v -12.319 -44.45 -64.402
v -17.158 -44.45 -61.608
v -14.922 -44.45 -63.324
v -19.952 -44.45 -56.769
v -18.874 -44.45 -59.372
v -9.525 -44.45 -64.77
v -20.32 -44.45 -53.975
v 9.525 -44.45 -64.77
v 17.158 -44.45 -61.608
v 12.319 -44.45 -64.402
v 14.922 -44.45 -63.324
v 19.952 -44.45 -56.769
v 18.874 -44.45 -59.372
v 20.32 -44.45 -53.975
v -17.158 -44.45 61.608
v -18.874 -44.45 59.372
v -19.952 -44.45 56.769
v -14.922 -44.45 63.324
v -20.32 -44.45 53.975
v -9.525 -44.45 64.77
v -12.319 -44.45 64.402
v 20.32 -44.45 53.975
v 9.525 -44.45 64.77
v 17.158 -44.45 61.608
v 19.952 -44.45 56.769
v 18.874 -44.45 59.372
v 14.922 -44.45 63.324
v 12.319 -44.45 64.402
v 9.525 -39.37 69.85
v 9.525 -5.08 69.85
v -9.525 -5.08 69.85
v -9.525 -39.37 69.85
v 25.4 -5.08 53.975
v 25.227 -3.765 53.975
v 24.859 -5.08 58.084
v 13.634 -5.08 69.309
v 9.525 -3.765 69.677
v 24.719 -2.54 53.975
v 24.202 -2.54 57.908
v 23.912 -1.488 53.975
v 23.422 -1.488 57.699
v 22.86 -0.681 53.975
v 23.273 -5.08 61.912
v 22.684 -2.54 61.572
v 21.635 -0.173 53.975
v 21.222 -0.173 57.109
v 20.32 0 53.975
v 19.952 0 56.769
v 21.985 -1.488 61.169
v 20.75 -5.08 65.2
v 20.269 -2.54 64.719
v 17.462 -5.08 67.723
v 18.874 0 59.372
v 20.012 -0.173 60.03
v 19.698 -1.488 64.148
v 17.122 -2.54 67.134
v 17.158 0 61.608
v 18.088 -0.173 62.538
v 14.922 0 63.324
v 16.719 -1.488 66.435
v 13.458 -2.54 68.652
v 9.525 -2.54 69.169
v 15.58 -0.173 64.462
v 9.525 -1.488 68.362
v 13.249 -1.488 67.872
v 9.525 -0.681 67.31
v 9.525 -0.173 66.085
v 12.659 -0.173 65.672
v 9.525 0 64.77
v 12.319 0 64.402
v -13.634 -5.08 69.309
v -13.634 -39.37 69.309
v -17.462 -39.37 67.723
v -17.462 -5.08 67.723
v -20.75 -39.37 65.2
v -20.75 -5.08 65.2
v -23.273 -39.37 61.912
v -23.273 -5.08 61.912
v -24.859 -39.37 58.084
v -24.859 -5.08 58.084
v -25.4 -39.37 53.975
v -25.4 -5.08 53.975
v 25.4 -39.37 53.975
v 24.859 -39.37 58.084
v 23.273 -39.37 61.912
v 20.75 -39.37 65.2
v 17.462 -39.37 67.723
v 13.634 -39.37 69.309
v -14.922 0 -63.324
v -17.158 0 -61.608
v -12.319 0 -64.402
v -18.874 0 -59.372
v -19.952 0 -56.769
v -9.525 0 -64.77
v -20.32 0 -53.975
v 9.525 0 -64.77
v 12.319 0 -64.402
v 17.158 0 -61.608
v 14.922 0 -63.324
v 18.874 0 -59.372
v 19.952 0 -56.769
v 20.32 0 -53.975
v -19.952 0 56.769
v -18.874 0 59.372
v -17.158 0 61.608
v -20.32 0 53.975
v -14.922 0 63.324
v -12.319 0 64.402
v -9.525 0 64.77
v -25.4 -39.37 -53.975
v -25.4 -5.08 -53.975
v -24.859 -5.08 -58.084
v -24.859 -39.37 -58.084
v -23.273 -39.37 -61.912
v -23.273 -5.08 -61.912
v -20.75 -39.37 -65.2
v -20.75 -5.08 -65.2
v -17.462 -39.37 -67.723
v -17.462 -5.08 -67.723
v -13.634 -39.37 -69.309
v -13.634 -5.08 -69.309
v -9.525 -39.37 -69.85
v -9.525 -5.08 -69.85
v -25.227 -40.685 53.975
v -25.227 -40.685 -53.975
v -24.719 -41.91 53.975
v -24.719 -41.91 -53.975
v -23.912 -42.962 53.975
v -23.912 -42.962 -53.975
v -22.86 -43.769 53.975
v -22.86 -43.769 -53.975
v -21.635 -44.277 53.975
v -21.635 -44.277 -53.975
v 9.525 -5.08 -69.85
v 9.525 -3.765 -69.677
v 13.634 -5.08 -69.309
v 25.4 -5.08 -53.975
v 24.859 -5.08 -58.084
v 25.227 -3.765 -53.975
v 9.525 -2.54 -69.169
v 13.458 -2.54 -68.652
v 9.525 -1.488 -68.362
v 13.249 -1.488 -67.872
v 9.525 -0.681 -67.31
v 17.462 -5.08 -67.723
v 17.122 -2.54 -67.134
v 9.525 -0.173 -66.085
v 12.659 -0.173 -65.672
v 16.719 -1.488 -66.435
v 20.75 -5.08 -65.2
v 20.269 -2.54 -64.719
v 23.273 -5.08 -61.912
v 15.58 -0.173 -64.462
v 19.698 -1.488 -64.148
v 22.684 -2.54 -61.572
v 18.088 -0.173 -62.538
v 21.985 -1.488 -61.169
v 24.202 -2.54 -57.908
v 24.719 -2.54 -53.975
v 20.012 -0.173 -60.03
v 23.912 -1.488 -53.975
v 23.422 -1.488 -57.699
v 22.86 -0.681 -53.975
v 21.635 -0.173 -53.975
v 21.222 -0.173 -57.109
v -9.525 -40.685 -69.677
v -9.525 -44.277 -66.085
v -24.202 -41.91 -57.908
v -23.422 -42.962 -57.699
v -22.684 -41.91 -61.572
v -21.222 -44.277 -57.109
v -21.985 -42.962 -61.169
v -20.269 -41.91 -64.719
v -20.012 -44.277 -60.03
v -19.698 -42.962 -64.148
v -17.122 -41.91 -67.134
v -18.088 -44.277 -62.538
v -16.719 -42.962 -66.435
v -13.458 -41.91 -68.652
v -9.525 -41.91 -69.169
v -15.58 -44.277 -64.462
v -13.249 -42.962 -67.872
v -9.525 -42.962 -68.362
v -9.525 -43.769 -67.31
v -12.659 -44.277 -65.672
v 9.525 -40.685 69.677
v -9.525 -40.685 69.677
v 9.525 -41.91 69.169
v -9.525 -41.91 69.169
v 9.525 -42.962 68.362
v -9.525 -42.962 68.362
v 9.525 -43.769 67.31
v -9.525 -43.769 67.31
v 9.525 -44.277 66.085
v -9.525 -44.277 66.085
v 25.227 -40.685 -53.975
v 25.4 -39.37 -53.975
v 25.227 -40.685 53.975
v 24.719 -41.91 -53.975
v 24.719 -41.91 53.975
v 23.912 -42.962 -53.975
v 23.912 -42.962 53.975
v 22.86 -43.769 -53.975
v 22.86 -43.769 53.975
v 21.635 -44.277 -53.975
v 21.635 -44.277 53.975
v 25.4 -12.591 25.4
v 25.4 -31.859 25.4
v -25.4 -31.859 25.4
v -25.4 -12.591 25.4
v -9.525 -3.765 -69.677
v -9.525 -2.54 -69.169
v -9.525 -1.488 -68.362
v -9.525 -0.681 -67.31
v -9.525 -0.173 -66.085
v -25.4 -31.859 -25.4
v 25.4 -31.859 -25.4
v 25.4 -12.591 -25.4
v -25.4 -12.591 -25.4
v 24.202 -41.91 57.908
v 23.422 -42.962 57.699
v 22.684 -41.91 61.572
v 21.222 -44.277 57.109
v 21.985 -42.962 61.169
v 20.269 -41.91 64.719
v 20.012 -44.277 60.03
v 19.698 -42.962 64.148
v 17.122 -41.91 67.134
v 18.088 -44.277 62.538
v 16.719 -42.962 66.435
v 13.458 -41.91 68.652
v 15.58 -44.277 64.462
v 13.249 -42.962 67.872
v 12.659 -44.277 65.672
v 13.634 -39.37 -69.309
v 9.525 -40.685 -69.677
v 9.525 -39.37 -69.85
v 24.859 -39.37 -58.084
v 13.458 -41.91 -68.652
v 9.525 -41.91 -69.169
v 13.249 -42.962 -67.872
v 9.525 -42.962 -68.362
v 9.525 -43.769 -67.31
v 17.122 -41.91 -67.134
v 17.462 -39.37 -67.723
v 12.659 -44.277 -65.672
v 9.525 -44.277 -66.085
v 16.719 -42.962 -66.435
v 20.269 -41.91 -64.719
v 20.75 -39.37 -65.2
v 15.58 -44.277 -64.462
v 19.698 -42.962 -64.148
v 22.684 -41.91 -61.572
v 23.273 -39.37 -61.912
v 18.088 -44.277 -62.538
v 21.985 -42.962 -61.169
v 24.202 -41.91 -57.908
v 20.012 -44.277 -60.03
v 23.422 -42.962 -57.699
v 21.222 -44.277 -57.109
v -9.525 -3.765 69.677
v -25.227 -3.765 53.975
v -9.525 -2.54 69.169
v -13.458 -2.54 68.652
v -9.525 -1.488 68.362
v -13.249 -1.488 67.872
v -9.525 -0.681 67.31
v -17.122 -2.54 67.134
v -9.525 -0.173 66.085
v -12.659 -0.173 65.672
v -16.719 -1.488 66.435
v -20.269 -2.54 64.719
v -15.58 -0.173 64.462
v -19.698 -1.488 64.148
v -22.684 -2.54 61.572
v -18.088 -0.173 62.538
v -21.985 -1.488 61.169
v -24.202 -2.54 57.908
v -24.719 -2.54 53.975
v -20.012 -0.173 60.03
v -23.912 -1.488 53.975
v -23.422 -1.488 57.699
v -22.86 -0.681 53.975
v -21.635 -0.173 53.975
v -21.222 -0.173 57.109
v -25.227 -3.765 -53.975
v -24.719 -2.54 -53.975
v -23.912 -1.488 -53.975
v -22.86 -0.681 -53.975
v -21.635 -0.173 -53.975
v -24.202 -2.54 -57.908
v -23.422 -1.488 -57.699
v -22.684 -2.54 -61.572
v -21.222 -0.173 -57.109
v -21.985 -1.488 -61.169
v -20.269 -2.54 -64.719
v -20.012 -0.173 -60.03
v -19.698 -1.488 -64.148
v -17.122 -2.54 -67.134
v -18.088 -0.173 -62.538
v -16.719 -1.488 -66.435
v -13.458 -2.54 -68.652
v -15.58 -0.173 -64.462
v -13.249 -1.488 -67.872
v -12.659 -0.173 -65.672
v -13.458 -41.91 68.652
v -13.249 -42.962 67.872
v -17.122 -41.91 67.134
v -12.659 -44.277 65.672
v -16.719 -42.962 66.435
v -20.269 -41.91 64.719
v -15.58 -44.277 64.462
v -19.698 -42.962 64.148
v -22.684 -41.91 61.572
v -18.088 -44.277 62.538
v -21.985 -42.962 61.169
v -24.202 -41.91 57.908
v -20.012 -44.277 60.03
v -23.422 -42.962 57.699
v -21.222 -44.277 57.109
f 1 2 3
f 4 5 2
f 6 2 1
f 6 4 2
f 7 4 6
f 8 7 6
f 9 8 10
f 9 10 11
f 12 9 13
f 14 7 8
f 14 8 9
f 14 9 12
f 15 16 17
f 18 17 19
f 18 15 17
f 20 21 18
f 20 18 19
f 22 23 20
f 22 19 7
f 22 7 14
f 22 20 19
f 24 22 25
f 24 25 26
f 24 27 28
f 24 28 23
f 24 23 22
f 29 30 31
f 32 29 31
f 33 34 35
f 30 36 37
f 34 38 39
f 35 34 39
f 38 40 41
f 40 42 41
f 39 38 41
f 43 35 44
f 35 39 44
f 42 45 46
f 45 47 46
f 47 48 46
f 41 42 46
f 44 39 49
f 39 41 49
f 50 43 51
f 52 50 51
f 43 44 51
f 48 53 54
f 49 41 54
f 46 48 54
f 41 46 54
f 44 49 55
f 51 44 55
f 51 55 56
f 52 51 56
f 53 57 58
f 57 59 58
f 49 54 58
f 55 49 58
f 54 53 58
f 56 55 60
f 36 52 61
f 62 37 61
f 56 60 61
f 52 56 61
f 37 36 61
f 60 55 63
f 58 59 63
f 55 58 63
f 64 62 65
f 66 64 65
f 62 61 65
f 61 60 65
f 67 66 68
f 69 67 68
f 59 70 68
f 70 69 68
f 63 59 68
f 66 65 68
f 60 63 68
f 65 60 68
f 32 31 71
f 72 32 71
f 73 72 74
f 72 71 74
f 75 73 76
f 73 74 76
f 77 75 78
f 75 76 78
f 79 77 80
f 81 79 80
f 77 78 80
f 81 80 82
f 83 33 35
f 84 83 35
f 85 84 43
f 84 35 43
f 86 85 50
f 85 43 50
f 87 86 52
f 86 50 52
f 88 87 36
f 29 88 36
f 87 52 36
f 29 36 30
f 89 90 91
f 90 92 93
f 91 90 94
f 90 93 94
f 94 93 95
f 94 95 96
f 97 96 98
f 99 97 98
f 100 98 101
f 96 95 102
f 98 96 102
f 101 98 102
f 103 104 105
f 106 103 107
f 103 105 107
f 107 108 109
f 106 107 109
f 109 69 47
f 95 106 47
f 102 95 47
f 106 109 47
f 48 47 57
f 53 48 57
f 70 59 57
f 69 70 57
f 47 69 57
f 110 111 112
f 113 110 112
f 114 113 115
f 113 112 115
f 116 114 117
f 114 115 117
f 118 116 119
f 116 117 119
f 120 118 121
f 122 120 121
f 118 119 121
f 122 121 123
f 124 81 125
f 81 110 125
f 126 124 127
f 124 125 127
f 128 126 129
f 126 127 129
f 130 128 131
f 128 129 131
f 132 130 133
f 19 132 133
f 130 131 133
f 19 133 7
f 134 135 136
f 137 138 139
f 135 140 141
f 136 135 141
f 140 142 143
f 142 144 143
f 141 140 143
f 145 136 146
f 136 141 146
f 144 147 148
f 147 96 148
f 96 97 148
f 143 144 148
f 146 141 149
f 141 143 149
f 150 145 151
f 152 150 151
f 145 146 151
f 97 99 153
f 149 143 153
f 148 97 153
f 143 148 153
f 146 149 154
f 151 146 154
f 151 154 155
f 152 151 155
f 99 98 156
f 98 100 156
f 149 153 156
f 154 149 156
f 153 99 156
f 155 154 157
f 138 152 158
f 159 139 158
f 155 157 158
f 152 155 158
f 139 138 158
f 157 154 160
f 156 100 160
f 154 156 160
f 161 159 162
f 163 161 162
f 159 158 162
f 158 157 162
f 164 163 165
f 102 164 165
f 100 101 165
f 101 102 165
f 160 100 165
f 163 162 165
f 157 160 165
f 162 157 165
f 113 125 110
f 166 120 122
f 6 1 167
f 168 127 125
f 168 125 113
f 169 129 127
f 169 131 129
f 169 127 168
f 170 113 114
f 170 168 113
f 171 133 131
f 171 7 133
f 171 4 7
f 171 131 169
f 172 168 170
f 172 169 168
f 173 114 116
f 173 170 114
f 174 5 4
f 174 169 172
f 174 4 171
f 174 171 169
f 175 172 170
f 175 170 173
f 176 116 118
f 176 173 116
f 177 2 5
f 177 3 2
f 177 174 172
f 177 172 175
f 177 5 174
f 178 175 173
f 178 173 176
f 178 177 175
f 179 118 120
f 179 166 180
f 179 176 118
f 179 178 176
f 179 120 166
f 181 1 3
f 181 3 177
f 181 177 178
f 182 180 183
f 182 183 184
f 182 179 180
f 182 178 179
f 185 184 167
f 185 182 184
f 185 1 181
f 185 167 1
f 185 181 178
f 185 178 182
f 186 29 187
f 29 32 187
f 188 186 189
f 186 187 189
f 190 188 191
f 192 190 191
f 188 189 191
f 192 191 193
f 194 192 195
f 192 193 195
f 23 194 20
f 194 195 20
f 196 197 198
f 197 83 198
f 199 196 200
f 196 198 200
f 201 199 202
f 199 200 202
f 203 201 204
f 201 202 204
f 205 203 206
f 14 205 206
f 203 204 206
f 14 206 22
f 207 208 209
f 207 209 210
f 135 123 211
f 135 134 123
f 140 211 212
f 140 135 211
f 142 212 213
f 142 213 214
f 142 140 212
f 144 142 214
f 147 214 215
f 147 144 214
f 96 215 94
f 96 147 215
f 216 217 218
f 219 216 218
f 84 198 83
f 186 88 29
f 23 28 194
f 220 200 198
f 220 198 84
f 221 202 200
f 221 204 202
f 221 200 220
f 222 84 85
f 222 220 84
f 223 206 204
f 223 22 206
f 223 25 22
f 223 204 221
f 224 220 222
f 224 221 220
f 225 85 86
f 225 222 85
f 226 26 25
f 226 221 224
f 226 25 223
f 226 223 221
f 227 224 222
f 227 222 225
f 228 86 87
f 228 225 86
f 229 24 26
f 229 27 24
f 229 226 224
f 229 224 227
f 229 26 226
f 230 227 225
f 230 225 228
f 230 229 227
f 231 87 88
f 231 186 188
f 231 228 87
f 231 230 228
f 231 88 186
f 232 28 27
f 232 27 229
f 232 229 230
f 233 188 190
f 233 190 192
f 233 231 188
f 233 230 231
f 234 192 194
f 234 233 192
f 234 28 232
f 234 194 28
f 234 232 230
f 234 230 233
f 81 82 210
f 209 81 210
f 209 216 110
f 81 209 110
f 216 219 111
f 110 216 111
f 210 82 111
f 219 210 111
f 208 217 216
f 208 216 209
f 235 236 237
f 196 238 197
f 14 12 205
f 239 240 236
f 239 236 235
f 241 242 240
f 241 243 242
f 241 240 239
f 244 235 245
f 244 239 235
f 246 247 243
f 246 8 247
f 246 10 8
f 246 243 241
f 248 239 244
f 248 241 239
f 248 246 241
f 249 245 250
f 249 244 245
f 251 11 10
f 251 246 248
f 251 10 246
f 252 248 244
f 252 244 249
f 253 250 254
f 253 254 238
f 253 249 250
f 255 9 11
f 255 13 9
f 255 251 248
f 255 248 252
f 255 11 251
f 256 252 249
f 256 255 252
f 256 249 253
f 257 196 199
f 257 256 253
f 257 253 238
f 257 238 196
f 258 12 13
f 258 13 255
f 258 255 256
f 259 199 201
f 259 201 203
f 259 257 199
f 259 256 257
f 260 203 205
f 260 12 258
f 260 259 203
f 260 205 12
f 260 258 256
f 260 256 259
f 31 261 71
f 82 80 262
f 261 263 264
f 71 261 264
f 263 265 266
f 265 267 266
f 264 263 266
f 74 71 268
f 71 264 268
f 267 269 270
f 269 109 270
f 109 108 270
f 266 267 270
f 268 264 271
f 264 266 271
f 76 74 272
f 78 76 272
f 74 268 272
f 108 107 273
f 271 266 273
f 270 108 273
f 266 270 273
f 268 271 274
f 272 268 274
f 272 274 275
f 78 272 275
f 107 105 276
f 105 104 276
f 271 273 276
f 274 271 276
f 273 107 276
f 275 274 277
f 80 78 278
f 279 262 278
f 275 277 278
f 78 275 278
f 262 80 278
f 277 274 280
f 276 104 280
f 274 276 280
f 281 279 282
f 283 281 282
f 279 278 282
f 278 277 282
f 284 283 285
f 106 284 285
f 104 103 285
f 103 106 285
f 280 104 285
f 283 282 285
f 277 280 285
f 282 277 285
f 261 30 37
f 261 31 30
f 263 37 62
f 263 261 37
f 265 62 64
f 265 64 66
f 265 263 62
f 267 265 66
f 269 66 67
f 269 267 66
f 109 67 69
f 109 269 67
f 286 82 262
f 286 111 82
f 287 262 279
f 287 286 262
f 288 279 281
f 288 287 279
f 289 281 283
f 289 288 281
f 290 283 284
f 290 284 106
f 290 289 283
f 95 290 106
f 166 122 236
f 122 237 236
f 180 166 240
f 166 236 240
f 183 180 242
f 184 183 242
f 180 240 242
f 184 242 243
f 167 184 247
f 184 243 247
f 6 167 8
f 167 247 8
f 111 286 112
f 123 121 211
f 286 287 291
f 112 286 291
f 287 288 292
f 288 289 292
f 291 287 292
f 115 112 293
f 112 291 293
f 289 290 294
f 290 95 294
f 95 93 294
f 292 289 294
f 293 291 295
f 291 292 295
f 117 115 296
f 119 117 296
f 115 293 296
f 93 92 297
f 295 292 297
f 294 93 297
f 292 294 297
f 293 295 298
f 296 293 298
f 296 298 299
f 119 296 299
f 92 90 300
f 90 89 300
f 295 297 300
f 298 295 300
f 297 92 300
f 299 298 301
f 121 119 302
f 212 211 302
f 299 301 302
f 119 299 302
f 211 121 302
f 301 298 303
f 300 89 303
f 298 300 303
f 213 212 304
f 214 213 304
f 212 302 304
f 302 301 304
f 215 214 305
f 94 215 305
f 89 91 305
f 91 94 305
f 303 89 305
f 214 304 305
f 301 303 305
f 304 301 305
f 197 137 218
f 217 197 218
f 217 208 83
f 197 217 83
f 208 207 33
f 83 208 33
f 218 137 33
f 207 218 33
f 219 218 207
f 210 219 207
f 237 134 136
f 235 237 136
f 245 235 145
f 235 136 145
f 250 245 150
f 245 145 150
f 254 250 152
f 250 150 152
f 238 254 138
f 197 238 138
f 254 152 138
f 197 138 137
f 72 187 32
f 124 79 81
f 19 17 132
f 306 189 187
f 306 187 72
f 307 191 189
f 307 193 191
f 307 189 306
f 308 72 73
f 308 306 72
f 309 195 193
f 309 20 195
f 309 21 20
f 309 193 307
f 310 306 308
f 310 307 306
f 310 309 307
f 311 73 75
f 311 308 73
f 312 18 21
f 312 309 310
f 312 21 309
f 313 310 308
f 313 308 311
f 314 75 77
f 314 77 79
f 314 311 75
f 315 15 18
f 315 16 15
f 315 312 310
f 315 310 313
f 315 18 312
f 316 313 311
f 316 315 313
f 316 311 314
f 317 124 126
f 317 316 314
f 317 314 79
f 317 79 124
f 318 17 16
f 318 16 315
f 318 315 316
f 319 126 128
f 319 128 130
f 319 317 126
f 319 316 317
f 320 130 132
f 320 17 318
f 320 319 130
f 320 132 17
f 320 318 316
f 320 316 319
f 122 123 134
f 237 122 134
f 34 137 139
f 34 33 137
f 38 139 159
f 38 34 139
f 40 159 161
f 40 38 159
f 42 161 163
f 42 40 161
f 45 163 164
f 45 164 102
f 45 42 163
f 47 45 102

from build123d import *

# Parameters (mm, degrees)
F1_DEPTH = 44.45
F2_R     = 5.08
F3_W     = 19.267222
F3_H     = 50.8
F4_DEPTH = 50.801


with BuildPart() as f1:
    # F0 (on Front) → F1 (new body)
    with BuildSketch(Plane.XZ):
        with BuildLine():
            ThreePointArc((-25.4, -53.975), (-20.75032, -65.20032), (-9.525, -69.85))
            Line((-9.525, -69.85), (9.525, -69.85))
            ThreePointArc((9.525, -69.85), (20.75032, -65.20032), (25.4, -53.975))
            Line((25.4, -53.975), (25.4, 53.975))
            ThreePointArc((25.4, 53.975), (20.75032, 65.20032), (9.525, 69.85))
            Line((9.525, 69.85), (-9.525, 69.85))
            ThreePointArc((-9.525, 69.85), (-20.75032, 65.20032), (-25.4, 53.975))
            Line((-25.4, 53.975), (-25.4, -53.975))
        make_face()
    extrude(amount=F1_DEPTH)

    # F2
    f2_edges = [f1.edges().sort_by_distance(p)[0] for p in [
        (0, -44.45, 69.85),
        (-20.75032, -44.45, -65.20032),
        (0, -44.45, -69.85),
        (20.75032, -44.45, -65.20032),
        (25.4, -44.45, 0),
        (20.75032, -44.45, 65.20032),
        (-20.75032, -44.45, 65.20032),
        (-25.4, -44.45, 0),
        (0, 0, 69.85),
        (25.4, 0, 0),
    ]]
    fillet(f2_edges, radius=F2_R)

    # F3 (on face) → F4 (cut, through all)
    with BuildSketch(Plane.YZ.offset(25.4)):
        with Locations((-22.225, 0)):
            Rectangle(F3_W, F3_H)
    extrude(amount=-F4_DEPTH, mode=Mode.SUBTRACT)


solid = f1.part
